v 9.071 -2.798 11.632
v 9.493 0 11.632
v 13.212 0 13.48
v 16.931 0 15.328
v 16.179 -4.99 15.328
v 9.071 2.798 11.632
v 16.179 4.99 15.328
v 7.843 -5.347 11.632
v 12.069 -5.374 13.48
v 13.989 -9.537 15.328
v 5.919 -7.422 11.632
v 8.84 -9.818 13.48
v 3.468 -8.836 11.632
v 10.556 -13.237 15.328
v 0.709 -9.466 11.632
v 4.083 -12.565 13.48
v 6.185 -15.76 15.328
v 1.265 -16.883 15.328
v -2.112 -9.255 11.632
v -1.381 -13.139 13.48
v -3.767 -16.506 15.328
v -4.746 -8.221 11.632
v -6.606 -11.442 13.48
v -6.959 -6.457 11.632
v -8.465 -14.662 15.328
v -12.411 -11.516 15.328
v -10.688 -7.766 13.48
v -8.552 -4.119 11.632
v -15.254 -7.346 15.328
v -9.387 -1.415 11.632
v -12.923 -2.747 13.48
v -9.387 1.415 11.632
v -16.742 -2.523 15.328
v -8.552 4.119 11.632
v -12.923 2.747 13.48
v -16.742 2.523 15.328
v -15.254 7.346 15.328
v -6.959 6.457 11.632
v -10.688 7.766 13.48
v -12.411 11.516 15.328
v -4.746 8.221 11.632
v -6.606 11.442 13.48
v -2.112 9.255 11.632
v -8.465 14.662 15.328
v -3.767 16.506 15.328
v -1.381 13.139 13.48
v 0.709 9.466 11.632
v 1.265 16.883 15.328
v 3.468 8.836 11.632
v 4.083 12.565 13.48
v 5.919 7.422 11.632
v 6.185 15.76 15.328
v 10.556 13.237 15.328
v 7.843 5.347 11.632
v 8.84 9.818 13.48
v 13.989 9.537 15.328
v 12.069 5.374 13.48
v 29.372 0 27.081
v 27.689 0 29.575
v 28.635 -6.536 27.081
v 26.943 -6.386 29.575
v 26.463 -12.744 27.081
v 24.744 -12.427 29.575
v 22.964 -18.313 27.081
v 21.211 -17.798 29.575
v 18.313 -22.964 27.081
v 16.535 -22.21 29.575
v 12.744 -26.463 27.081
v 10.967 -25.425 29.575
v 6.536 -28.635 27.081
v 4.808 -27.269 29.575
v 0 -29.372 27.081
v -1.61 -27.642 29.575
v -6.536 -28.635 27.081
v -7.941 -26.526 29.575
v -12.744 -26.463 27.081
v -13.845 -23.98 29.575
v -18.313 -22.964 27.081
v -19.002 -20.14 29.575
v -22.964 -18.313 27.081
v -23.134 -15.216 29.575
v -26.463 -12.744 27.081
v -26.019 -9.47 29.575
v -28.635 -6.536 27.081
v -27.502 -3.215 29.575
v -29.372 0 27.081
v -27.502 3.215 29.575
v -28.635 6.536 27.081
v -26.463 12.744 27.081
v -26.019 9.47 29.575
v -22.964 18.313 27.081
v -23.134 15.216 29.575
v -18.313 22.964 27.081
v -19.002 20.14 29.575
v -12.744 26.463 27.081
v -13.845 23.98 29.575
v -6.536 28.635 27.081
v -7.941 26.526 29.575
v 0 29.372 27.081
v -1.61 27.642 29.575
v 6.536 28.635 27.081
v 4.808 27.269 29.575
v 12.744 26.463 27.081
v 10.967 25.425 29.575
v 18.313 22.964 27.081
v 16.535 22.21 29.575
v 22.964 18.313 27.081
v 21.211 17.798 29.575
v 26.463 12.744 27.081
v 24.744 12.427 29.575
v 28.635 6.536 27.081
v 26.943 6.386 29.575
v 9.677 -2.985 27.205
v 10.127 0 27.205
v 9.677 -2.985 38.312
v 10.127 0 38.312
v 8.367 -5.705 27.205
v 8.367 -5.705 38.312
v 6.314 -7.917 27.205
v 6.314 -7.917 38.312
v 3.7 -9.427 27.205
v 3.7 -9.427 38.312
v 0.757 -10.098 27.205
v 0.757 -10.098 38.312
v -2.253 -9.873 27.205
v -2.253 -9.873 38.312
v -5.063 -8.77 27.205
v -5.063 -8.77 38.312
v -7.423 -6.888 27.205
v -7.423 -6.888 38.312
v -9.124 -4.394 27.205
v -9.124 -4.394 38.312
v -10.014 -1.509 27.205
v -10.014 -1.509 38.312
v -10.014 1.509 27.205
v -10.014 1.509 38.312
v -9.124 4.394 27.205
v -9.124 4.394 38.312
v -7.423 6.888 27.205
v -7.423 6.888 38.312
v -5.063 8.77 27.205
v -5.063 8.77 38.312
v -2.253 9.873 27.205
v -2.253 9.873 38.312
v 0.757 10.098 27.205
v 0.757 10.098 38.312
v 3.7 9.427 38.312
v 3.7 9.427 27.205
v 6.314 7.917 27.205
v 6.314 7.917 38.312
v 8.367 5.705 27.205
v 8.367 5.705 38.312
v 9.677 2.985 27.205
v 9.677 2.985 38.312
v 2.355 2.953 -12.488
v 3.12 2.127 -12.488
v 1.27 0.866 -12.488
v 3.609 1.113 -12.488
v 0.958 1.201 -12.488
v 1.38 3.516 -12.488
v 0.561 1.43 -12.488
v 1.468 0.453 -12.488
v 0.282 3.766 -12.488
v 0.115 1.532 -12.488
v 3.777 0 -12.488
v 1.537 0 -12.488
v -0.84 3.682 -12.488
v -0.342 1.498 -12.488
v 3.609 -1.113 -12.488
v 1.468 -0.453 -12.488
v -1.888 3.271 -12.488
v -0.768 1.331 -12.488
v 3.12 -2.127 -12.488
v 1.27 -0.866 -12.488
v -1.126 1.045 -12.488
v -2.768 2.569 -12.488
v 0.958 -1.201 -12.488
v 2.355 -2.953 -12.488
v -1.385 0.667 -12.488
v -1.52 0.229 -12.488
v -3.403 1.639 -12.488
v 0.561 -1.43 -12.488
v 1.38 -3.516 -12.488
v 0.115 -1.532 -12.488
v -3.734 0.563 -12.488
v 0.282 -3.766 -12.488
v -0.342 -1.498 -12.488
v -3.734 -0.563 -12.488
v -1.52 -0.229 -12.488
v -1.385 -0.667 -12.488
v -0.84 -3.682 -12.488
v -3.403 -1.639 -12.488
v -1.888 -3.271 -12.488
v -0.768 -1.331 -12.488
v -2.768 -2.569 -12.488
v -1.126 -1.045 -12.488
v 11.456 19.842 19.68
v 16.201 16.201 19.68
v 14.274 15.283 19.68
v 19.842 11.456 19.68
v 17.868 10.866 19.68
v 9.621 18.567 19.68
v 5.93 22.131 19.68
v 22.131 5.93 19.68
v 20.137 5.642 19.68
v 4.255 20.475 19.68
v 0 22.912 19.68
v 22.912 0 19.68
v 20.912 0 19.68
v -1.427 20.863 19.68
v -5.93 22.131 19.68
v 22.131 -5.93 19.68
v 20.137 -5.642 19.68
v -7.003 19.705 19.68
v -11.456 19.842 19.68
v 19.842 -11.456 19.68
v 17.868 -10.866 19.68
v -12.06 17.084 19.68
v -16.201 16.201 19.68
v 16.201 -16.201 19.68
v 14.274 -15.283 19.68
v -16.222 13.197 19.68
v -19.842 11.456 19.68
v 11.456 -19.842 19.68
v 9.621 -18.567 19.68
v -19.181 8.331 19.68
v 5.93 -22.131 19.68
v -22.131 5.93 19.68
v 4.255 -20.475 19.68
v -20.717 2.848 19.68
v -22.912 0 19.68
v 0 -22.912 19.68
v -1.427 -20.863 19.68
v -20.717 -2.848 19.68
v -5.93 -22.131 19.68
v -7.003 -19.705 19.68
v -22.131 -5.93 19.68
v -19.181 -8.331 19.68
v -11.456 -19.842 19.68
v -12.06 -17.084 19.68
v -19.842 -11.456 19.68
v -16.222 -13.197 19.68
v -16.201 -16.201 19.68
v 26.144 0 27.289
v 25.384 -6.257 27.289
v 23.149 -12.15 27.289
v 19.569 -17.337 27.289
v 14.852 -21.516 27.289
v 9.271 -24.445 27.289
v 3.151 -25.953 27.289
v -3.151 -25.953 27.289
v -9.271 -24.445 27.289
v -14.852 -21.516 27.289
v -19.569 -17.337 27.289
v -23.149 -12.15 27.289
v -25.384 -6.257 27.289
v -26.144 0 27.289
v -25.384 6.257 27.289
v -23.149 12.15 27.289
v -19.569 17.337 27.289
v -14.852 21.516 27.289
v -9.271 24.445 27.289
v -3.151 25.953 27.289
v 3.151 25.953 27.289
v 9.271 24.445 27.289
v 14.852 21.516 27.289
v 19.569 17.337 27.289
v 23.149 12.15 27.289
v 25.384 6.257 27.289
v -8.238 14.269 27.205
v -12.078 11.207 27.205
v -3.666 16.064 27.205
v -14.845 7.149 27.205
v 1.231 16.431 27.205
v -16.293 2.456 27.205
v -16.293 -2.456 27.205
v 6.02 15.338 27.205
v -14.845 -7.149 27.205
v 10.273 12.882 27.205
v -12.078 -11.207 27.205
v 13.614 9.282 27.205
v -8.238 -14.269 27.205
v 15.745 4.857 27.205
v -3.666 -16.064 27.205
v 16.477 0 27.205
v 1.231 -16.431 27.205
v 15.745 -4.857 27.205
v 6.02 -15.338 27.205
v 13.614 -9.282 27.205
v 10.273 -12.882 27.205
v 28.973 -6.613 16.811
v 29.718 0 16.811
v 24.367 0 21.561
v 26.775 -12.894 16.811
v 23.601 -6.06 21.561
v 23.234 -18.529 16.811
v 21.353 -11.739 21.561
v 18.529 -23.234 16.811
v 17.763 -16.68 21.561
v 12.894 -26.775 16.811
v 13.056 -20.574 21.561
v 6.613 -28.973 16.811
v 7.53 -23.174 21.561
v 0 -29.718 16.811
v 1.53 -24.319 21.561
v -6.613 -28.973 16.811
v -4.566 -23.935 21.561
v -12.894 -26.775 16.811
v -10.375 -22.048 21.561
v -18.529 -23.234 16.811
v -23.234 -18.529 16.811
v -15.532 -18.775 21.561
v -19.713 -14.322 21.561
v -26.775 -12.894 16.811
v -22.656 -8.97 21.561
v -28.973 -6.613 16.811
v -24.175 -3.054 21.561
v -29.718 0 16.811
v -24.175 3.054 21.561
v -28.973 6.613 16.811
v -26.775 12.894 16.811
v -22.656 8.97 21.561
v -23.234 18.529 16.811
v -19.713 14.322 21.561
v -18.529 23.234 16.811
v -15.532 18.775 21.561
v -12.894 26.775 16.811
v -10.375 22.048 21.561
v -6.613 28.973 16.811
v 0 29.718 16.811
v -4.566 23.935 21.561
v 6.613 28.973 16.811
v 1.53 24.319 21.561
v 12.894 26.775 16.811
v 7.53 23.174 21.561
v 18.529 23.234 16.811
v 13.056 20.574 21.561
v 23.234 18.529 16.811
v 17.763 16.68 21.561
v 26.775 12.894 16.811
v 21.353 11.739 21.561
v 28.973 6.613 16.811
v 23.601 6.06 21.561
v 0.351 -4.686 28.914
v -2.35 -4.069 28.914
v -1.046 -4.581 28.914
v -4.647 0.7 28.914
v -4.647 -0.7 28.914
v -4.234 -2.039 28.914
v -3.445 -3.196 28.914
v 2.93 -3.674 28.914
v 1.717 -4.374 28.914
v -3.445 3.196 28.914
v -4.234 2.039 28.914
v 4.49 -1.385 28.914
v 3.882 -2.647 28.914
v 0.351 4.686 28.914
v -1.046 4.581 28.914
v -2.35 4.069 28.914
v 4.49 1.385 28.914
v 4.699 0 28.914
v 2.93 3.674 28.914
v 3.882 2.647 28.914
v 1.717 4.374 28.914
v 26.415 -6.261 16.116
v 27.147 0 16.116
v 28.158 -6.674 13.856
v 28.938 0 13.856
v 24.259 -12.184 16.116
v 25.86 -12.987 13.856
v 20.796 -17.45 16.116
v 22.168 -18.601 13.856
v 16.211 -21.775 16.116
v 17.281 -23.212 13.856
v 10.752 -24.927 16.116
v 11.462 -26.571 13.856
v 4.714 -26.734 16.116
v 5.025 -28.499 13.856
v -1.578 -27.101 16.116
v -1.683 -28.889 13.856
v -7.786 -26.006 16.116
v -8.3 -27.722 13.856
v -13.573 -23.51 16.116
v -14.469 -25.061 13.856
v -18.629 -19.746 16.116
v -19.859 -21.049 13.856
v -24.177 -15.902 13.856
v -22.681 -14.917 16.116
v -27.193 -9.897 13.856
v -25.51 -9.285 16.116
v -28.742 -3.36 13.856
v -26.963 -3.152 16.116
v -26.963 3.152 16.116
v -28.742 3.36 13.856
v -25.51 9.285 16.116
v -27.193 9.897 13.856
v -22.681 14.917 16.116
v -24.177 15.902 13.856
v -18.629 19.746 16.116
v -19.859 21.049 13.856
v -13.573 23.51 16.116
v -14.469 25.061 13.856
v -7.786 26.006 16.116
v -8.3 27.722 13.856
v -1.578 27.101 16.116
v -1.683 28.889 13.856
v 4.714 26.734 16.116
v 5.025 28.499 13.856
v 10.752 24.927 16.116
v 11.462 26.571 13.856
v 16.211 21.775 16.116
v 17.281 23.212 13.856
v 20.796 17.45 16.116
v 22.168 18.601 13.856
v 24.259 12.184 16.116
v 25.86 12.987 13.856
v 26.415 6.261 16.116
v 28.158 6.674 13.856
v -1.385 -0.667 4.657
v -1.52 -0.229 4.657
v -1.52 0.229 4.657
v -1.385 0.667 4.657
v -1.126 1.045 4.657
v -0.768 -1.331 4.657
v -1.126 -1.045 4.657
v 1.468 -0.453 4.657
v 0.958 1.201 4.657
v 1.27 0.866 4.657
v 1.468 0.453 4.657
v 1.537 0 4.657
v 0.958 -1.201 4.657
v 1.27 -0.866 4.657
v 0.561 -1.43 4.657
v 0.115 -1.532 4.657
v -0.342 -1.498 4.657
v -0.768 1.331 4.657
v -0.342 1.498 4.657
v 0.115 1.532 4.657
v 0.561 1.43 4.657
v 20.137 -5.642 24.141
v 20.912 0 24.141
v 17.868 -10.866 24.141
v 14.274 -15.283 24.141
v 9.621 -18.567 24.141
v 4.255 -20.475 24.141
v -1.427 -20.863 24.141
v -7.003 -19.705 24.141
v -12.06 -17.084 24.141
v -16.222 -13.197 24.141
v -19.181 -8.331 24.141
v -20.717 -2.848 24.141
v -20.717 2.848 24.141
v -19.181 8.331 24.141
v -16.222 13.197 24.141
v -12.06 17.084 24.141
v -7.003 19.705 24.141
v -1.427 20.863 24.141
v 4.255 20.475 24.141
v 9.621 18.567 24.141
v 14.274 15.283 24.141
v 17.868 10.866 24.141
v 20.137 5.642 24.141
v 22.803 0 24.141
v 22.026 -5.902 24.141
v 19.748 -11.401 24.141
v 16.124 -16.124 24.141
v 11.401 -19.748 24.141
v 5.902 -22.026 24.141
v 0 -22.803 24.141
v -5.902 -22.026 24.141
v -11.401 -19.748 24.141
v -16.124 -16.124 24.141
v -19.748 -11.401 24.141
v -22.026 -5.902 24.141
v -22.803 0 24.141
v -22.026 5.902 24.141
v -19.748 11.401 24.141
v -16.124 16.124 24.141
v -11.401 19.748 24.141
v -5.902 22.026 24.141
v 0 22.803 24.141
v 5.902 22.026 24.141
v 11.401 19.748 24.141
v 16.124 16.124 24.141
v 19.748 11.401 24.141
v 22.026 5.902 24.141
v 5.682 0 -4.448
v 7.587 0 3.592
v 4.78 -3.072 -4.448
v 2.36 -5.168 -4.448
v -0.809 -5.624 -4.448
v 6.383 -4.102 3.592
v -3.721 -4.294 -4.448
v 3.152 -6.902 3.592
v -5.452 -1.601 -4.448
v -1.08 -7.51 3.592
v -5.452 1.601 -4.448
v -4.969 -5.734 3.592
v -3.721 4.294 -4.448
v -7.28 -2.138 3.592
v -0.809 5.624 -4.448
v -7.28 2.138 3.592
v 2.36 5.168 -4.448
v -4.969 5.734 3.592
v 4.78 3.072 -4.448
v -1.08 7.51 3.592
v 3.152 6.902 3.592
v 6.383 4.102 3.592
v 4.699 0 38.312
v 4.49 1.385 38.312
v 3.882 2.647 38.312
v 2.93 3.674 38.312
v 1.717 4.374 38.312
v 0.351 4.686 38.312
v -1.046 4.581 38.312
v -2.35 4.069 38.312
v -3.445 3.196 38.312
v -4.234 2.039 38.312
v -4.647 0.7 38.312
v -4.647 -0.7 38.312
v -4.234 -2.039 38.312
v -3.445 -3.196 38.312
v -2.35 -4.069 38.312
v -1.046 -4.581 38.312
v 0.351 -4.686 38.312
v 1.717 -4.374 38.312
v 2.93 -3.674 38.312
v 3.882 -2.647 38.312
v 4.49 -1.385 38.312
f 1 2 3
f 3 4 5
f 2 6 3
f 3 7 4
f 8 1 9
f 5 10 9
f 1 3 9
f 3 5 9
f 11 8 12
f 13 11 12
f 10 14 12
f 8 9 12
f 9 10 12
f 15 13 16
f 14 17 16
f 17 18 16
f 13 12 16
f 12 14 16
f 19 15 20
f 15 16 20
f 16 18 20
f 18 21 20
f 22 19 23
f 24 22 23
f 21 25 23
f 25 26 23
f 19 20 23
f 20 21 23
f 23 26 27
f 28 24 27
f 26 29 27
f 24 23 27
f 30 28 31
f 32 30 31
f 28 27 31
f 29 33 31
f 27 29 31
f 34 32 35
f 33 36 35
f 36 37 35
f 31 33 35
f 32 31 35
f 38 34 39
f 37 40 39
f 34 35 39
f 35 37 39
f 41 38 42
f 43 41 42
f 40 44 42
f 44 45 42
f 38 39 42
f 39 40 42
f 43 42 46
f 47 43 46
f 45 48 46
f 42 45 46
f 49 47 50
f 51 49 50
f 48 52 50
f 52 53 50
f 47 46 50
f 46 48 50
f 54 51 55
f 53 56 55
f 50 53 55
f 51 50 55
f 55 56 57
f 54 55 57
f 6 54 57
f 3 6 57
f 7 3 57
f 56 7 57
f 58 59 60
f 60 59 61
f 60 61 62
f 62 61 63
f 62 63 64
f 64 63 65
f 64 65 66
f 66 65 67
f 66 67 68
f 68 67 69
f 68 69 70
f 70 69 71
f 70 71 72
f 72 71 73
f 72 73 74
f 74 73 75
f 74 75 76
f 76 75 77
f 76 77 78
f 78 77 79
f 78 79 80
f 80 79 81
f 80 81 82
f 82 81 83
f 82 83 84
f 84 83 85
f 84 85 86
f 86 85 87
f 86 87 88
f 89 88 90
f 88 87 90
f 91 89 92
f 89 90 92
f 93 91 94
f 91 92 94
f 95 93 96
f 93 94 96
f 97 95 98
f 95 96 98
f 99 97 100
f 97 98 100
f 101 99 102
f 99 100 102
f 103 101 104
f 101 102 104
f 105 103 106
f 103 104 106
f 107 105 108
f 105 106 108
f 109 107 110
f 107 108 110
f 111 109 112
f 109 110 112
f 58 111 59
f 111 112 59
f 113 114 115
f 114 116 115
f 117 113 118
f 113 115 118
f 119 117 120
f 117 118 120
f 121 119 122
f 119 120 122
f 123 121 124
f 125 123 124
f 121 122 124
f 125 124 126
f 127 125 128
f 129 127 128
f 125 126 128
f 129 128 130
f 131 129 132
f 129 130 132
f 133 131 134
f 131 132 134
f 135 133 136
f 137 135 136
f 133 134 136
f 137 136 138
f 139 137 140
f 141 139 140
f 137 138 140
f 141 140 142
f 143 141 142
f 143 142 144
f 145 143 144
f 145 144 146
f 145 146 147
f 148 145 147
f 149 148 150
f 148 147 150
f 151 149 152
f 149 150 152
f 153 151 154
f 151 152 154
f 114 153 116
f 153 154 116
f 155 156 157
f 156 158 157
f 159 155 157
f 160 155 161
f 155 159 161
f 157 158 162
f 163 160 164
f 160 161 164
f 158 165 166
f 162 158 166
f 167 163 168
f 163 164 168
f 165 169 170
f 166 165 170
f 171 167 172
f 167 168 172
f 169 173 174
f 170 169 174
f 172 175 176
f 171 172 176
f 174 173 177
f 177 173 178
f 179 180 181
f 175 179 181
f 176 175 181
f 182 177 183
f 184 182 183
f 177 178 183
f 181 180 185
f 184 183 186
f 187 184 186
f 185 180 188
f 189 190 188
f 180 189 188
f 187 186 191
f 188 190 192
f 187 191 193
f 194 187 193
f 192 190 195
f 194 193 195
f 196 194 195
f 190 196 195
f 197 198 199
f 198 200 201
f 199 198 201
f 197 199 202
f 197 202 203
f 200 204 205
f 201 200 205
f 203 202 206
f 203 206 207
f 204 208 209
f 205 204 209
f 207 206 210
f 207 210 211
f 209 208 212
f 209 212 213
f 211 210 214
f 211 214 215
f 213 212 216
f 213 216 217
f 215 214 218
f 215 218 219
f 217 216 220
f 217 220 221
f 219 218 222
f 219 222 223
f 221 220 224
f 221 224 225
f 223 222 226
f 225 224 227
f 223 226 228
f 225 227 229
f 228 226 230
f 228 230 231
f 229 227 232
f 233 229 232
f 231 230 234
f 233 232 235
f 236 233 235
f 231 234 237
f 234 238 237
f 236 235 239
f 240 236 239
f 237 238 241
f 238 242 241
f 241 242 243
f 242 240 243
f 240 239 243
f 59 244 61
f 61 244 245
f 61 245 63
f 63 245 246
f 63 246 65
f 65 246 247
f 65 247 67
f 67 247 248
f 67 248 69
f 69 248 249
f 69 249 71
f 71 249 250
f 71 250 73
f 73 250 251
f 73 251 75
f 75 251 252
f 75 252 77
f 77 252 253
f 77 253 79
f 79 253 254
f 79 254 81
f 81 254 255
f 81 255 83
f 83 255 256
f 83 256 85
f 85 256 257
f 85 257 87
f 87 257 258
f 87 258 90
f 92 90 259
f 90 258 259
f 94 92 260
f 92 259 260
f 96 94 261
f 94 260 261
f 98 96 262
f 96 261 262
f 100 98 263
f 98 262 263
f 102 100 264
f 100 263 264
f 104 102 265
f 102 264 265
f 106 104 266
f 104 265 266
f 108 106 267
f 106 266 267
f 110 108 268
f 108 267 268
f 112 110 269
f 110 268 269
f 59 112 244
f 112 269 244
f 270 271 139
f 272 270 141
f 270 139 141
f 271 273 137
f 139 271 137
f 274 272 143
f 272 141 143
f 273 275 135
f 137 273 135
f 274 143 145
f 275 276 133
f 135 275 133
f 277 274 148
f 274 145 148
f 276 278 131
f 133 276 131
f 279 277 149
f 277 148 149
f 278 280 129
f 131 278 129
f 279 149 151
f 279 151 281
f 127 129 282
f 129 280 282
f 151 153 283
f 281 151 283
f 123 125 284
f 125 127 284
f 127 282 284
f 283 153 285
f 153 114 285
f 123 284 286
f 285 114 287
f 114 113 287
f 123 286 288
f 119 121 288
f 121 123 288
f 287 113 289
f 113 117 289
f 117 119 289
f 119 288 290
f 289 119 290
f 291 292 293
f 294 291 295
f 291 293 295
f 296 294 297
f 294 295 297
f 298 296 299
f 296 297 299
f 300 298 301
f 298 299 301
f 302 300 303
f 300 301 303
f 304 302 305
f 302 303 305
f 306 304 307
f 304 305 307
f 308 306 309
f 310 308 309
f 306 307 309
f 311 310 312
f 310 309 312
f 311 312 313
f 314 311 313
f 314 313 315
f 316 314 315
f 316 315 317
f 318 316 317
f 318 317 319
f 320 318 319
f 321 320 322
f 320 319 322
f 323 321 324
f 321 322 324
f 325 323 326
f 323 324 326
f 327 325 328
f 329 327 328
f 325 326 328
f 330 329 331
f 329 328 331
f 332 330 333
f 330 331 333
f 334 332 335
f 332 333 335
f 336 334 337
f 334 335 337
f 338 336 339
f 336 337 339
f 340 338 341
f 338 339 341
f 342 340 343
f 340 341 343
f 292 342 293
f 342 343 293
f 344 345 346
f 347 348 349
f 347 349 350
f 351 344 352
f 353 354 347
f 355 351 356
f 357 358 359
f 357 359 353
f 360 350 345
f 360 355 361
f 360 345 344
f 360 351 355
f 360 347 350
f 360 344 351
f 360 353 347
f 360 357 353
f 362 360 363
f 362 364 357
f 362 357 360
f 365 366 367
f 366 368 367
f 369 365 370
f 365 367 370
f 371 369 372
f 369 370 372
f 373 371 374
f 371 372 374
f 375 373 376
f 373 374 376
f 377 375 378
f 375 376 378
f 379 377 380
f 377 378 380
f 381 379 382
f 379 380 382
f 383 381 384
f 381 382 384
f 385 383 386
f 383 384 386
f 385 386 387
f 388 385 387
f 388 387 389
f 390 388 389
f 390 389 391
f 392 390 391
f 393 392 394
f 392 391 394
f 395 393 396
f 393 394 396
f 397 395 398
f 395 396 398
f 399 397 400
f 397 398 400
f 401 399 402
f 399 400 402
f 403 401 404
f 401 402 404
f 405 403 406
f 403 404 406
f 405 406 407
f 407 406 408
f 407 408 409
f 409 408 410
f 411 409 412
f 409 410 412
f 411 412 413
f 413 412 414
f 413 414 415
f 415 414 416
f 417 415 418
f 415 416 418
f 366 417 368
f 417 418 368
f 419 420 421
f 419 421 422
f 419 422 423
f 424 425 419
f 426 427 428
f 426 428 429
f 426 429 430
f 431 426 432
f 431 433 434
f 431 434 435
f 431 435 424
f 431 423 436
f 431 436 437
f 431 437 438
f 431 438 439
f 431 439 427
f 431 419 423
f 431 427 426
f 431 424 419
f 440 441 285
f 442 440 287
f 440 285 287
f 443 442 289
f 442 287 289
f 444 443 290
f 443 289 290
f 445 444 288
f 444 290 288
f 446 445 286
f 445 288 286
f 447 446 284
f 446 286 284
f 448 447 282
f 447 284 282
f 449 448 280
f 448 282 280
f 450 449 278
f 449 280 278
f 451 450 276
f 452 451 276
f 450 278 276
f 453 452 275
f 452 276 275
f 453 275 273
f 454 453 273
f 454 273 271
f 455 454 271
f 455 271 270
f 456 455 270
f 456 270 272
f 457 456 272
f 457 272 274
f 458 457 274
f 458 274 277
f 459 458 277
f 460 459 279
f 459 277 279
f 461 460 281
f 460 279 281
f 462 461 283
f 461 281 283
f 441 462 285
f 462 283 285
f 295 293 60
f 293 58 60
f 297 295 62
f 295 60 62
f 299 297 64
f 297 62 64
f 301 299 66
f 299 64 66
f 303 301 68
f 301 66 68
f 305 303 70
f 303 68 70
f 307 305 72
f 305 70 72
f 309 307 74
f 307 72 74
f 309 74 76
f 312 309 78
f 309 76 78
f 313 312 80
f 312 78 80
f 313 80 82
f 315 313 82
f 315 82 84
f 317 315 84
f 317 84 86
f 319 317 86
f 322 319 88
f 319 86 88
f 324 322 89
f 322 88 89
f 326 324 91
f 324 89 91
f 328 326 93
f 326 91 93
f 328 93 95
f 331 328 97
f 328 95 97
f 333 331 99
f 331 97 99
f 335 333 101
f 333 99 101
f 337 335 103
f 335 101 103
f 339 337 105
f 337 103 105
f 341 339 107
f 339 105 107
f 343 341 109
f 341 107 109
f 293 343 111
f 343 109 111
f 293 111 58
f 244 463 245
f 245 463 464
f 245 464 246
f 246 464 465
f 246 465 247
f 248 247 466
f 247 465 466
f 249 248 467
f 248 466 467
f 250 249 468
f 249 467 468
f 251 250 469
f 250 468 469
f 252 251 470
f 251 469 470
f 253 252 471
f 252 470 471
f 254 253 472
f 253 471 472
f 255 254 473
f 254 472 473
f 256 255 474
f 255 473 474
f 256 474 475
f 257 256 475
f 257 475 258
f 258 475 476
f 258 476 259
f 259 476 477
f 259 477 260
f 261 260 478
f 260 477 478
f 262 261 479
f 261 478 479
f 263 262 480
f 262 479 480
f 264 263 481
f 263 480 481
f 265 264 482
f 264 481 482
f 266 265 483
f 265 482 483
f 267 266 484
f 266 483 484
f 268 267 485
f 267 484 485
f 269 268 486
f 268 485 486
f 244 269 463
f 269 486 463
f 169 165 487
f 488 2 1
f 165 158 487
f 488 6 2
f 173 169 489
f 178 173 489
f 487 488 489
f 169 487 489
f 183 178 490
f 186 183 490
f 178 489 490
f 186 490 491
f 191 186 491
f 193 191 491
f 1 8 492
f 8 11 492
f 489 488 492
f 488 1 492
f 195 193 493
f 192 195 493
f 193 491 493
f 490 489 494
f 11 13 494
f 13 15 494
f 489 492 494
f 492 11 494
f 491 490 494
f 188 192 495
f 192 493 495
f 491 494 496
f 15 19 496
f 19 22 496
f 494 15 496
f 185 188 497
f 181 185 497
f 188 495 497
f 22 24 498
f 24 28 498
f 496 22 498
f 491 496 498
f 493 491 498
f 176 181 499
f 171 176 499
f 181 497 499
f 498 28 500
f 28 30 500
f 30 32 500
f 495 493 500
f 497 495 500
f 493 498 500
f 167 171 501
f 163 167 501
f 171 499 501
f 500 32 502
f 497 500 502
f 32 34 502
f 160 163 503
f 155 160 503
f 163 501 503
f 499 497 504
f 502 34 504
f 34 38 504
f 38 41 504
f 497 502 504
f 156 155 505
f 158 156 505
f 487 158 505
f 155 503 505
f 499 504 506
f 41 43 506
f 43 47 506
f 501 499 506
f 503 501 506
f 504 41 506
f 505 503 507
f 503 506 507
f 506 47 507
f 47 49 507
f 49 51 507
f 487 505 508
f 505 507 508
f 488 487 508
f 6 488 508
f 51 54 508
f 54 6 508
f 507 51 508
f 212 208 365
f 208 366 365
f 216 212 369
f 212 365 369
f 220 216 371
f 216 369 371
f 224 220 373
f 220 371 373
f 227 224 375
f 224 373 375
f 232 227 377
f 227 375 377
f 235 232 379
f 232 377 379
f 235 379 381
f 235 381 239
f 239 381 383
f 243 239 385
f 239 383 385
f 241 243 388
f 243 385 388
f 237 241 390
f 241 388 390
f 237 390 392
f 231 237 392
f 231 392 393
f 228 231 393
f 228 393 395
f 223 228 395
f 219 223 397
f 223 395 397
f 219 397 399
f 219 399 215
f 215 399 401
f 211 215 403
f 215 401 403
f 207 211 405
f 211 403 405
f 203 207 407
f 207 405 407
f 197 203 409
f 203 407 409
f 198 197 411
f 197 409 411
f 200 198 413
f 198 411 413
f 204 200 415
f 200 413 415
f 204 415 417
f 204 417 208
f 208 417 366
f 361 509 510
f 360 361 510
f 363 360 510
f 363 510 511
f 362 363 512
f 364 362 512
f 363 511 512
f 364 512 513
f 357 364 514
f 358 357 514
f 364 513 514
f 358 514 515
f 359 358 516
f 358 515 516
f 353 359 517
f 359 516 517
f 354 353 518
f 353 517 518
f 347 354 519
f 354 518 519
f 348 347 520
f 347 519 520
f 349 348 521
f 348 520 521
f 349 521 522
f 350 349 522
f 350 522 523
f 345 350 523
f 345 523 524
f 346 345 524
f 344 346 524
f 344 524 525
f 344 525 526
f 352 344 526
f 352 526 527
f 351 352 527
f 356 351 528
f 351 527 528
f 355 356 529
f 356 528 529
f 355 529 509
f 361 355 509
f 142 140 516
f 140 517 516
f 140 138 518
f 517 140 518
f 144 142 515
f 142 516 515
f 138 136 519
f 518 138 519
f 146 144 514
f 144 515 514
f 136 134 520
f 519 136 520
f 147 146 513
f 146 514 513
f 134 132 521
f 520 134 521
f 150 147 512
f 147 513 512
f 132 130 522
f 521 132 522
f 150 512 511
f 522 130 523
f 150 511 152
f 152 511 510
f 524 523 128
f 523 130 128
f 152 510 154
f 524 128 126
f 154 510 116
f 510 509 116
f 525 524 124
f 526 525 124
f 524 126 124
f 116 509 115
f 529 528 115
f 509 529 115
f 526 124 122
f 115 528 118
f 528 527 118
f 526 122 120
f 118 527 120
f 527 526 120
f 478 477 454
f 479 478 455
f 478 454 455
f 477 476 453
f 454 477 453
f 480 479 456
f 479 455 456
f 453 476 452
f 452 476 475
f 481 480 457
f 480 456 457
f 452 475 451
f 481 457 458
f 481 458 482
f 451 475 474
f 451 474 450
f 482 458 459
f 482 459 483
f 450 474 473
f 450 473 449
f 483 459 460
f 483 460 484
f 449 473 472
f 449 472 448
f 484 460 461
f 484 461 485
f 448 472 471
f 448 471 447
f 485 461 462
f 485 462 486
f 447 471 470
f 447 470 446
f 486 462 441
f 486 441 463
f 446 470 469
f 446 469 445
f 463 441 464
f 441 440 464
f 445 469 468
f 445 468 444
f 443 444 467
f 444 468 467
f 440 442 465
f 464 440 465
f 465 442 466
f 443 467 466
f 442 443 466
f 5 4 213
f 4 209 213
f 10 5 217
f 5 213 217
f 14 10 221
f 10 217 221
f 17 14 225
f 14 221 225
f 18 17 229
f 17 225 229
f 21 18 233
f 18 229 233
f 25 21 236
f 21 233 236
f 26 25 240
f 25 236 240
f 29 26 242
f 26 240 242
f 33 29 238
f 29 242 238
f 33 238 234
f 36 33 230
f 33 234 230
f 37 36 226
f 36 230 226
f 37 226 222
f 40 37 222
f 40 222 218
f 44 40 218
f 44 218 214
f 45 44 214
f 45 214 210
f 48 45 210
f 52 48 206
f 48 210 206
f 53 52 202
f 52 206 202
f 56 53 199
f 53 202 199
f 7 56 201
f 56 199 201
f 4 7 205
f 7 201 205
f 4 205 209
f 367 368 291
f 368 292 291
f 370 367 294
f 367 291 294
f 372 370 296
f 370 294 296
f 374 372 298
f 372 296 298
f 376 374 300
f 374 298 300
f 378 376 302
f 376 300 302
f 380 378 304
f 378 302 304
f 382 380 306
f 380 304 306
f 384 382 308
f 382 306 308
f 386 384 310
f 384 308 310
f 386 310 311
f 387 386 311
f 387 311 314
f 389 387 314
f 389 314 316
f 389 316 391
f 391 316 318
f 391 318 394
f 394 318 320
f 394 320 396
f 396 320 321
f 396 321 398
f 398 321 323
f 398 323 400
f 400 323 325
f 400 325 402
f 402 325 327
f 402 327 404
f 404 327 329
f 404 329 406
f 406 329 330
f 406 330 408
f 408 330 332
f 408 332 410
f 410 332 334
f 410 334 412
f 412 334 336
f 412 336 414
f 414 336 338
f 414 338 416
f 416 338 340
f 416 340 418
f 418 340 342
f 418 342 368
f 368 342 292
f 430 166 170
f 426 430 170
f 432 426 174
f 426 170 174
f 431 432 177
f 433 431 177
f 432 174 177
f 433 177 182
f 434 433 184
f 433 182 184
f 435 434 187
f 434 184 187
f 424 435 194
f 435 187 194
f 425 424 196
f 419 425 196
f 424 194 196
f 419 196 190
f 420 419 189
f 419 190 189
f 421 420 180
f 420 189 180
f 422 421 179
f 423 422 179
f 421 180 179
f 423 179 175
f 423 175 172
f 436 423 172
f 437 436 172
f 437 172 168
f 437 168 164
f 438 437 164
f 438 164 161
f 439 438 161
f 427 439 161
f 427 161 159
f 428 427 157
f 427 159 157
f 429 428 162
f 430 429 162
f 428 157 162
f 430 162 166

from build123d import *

# Parameters (mm, degrees)
F2_R     = 4.699
F3_DEPTH = 9.398
F4_R     = 1.5367
F5_DEPTH = 17.145


# Not quite as in the source:
# - a feature names something its author has since deleted; it is built from what else it names


with BuildPart() as f1:
    # F0 (on Front) → F1 (revolve)
    with BuildSketch(Plane.XZ):
        Polygon((0, 27.8836265206), (0, -12.487935467), (3.7766563474, -12.487935467), (9.4925444573, 11.6318371147), (16.9307440519, 15.3280049562), (20.9119780944, 19.6802802384), (22.9117851704, 19.6802802384), (27.146894104, 16.1157515753), (28.938142141, 13.8561455533), (29.718, 16.8109368533), (24.366803943, 21.5609171673), (29.371801322, 27.0814523101), (27.6893377921, 29.5746776597), (26.144035833, 27.2886776597), (22.8029862046, 24.1410490125), (20.9119780944, 24.1410490125), (16.4766563474, 27.2050067903), (10.1266563474, 27.2050067903), (10.1266563474, 38.312064533), (0, 38.312064533), align=None)
    revolve(axis=Axis((0, 0, 7.6978455268), (0, 0, -1)))

    # F2 (on face) → F3 (cut)
    with BuildSketch(Plane.XY.offset(38.312064533)):
        Circle(F2_R)
    extrude(amount=-F3_DEPTH, mode=Mode.SUBTRACT)

    # F4 (on face) → F5 (cut)
    with BuildSketch(Plane(origin=(0, 0, -12.487935467), x_dir=(1, 0, 0), z_dir=(0, 0, -1))):
        Circle(F4_R)
    extrude(amount=-F5_DEPTH, mode=Mode.SUBTRACT)


solid = f1.part
